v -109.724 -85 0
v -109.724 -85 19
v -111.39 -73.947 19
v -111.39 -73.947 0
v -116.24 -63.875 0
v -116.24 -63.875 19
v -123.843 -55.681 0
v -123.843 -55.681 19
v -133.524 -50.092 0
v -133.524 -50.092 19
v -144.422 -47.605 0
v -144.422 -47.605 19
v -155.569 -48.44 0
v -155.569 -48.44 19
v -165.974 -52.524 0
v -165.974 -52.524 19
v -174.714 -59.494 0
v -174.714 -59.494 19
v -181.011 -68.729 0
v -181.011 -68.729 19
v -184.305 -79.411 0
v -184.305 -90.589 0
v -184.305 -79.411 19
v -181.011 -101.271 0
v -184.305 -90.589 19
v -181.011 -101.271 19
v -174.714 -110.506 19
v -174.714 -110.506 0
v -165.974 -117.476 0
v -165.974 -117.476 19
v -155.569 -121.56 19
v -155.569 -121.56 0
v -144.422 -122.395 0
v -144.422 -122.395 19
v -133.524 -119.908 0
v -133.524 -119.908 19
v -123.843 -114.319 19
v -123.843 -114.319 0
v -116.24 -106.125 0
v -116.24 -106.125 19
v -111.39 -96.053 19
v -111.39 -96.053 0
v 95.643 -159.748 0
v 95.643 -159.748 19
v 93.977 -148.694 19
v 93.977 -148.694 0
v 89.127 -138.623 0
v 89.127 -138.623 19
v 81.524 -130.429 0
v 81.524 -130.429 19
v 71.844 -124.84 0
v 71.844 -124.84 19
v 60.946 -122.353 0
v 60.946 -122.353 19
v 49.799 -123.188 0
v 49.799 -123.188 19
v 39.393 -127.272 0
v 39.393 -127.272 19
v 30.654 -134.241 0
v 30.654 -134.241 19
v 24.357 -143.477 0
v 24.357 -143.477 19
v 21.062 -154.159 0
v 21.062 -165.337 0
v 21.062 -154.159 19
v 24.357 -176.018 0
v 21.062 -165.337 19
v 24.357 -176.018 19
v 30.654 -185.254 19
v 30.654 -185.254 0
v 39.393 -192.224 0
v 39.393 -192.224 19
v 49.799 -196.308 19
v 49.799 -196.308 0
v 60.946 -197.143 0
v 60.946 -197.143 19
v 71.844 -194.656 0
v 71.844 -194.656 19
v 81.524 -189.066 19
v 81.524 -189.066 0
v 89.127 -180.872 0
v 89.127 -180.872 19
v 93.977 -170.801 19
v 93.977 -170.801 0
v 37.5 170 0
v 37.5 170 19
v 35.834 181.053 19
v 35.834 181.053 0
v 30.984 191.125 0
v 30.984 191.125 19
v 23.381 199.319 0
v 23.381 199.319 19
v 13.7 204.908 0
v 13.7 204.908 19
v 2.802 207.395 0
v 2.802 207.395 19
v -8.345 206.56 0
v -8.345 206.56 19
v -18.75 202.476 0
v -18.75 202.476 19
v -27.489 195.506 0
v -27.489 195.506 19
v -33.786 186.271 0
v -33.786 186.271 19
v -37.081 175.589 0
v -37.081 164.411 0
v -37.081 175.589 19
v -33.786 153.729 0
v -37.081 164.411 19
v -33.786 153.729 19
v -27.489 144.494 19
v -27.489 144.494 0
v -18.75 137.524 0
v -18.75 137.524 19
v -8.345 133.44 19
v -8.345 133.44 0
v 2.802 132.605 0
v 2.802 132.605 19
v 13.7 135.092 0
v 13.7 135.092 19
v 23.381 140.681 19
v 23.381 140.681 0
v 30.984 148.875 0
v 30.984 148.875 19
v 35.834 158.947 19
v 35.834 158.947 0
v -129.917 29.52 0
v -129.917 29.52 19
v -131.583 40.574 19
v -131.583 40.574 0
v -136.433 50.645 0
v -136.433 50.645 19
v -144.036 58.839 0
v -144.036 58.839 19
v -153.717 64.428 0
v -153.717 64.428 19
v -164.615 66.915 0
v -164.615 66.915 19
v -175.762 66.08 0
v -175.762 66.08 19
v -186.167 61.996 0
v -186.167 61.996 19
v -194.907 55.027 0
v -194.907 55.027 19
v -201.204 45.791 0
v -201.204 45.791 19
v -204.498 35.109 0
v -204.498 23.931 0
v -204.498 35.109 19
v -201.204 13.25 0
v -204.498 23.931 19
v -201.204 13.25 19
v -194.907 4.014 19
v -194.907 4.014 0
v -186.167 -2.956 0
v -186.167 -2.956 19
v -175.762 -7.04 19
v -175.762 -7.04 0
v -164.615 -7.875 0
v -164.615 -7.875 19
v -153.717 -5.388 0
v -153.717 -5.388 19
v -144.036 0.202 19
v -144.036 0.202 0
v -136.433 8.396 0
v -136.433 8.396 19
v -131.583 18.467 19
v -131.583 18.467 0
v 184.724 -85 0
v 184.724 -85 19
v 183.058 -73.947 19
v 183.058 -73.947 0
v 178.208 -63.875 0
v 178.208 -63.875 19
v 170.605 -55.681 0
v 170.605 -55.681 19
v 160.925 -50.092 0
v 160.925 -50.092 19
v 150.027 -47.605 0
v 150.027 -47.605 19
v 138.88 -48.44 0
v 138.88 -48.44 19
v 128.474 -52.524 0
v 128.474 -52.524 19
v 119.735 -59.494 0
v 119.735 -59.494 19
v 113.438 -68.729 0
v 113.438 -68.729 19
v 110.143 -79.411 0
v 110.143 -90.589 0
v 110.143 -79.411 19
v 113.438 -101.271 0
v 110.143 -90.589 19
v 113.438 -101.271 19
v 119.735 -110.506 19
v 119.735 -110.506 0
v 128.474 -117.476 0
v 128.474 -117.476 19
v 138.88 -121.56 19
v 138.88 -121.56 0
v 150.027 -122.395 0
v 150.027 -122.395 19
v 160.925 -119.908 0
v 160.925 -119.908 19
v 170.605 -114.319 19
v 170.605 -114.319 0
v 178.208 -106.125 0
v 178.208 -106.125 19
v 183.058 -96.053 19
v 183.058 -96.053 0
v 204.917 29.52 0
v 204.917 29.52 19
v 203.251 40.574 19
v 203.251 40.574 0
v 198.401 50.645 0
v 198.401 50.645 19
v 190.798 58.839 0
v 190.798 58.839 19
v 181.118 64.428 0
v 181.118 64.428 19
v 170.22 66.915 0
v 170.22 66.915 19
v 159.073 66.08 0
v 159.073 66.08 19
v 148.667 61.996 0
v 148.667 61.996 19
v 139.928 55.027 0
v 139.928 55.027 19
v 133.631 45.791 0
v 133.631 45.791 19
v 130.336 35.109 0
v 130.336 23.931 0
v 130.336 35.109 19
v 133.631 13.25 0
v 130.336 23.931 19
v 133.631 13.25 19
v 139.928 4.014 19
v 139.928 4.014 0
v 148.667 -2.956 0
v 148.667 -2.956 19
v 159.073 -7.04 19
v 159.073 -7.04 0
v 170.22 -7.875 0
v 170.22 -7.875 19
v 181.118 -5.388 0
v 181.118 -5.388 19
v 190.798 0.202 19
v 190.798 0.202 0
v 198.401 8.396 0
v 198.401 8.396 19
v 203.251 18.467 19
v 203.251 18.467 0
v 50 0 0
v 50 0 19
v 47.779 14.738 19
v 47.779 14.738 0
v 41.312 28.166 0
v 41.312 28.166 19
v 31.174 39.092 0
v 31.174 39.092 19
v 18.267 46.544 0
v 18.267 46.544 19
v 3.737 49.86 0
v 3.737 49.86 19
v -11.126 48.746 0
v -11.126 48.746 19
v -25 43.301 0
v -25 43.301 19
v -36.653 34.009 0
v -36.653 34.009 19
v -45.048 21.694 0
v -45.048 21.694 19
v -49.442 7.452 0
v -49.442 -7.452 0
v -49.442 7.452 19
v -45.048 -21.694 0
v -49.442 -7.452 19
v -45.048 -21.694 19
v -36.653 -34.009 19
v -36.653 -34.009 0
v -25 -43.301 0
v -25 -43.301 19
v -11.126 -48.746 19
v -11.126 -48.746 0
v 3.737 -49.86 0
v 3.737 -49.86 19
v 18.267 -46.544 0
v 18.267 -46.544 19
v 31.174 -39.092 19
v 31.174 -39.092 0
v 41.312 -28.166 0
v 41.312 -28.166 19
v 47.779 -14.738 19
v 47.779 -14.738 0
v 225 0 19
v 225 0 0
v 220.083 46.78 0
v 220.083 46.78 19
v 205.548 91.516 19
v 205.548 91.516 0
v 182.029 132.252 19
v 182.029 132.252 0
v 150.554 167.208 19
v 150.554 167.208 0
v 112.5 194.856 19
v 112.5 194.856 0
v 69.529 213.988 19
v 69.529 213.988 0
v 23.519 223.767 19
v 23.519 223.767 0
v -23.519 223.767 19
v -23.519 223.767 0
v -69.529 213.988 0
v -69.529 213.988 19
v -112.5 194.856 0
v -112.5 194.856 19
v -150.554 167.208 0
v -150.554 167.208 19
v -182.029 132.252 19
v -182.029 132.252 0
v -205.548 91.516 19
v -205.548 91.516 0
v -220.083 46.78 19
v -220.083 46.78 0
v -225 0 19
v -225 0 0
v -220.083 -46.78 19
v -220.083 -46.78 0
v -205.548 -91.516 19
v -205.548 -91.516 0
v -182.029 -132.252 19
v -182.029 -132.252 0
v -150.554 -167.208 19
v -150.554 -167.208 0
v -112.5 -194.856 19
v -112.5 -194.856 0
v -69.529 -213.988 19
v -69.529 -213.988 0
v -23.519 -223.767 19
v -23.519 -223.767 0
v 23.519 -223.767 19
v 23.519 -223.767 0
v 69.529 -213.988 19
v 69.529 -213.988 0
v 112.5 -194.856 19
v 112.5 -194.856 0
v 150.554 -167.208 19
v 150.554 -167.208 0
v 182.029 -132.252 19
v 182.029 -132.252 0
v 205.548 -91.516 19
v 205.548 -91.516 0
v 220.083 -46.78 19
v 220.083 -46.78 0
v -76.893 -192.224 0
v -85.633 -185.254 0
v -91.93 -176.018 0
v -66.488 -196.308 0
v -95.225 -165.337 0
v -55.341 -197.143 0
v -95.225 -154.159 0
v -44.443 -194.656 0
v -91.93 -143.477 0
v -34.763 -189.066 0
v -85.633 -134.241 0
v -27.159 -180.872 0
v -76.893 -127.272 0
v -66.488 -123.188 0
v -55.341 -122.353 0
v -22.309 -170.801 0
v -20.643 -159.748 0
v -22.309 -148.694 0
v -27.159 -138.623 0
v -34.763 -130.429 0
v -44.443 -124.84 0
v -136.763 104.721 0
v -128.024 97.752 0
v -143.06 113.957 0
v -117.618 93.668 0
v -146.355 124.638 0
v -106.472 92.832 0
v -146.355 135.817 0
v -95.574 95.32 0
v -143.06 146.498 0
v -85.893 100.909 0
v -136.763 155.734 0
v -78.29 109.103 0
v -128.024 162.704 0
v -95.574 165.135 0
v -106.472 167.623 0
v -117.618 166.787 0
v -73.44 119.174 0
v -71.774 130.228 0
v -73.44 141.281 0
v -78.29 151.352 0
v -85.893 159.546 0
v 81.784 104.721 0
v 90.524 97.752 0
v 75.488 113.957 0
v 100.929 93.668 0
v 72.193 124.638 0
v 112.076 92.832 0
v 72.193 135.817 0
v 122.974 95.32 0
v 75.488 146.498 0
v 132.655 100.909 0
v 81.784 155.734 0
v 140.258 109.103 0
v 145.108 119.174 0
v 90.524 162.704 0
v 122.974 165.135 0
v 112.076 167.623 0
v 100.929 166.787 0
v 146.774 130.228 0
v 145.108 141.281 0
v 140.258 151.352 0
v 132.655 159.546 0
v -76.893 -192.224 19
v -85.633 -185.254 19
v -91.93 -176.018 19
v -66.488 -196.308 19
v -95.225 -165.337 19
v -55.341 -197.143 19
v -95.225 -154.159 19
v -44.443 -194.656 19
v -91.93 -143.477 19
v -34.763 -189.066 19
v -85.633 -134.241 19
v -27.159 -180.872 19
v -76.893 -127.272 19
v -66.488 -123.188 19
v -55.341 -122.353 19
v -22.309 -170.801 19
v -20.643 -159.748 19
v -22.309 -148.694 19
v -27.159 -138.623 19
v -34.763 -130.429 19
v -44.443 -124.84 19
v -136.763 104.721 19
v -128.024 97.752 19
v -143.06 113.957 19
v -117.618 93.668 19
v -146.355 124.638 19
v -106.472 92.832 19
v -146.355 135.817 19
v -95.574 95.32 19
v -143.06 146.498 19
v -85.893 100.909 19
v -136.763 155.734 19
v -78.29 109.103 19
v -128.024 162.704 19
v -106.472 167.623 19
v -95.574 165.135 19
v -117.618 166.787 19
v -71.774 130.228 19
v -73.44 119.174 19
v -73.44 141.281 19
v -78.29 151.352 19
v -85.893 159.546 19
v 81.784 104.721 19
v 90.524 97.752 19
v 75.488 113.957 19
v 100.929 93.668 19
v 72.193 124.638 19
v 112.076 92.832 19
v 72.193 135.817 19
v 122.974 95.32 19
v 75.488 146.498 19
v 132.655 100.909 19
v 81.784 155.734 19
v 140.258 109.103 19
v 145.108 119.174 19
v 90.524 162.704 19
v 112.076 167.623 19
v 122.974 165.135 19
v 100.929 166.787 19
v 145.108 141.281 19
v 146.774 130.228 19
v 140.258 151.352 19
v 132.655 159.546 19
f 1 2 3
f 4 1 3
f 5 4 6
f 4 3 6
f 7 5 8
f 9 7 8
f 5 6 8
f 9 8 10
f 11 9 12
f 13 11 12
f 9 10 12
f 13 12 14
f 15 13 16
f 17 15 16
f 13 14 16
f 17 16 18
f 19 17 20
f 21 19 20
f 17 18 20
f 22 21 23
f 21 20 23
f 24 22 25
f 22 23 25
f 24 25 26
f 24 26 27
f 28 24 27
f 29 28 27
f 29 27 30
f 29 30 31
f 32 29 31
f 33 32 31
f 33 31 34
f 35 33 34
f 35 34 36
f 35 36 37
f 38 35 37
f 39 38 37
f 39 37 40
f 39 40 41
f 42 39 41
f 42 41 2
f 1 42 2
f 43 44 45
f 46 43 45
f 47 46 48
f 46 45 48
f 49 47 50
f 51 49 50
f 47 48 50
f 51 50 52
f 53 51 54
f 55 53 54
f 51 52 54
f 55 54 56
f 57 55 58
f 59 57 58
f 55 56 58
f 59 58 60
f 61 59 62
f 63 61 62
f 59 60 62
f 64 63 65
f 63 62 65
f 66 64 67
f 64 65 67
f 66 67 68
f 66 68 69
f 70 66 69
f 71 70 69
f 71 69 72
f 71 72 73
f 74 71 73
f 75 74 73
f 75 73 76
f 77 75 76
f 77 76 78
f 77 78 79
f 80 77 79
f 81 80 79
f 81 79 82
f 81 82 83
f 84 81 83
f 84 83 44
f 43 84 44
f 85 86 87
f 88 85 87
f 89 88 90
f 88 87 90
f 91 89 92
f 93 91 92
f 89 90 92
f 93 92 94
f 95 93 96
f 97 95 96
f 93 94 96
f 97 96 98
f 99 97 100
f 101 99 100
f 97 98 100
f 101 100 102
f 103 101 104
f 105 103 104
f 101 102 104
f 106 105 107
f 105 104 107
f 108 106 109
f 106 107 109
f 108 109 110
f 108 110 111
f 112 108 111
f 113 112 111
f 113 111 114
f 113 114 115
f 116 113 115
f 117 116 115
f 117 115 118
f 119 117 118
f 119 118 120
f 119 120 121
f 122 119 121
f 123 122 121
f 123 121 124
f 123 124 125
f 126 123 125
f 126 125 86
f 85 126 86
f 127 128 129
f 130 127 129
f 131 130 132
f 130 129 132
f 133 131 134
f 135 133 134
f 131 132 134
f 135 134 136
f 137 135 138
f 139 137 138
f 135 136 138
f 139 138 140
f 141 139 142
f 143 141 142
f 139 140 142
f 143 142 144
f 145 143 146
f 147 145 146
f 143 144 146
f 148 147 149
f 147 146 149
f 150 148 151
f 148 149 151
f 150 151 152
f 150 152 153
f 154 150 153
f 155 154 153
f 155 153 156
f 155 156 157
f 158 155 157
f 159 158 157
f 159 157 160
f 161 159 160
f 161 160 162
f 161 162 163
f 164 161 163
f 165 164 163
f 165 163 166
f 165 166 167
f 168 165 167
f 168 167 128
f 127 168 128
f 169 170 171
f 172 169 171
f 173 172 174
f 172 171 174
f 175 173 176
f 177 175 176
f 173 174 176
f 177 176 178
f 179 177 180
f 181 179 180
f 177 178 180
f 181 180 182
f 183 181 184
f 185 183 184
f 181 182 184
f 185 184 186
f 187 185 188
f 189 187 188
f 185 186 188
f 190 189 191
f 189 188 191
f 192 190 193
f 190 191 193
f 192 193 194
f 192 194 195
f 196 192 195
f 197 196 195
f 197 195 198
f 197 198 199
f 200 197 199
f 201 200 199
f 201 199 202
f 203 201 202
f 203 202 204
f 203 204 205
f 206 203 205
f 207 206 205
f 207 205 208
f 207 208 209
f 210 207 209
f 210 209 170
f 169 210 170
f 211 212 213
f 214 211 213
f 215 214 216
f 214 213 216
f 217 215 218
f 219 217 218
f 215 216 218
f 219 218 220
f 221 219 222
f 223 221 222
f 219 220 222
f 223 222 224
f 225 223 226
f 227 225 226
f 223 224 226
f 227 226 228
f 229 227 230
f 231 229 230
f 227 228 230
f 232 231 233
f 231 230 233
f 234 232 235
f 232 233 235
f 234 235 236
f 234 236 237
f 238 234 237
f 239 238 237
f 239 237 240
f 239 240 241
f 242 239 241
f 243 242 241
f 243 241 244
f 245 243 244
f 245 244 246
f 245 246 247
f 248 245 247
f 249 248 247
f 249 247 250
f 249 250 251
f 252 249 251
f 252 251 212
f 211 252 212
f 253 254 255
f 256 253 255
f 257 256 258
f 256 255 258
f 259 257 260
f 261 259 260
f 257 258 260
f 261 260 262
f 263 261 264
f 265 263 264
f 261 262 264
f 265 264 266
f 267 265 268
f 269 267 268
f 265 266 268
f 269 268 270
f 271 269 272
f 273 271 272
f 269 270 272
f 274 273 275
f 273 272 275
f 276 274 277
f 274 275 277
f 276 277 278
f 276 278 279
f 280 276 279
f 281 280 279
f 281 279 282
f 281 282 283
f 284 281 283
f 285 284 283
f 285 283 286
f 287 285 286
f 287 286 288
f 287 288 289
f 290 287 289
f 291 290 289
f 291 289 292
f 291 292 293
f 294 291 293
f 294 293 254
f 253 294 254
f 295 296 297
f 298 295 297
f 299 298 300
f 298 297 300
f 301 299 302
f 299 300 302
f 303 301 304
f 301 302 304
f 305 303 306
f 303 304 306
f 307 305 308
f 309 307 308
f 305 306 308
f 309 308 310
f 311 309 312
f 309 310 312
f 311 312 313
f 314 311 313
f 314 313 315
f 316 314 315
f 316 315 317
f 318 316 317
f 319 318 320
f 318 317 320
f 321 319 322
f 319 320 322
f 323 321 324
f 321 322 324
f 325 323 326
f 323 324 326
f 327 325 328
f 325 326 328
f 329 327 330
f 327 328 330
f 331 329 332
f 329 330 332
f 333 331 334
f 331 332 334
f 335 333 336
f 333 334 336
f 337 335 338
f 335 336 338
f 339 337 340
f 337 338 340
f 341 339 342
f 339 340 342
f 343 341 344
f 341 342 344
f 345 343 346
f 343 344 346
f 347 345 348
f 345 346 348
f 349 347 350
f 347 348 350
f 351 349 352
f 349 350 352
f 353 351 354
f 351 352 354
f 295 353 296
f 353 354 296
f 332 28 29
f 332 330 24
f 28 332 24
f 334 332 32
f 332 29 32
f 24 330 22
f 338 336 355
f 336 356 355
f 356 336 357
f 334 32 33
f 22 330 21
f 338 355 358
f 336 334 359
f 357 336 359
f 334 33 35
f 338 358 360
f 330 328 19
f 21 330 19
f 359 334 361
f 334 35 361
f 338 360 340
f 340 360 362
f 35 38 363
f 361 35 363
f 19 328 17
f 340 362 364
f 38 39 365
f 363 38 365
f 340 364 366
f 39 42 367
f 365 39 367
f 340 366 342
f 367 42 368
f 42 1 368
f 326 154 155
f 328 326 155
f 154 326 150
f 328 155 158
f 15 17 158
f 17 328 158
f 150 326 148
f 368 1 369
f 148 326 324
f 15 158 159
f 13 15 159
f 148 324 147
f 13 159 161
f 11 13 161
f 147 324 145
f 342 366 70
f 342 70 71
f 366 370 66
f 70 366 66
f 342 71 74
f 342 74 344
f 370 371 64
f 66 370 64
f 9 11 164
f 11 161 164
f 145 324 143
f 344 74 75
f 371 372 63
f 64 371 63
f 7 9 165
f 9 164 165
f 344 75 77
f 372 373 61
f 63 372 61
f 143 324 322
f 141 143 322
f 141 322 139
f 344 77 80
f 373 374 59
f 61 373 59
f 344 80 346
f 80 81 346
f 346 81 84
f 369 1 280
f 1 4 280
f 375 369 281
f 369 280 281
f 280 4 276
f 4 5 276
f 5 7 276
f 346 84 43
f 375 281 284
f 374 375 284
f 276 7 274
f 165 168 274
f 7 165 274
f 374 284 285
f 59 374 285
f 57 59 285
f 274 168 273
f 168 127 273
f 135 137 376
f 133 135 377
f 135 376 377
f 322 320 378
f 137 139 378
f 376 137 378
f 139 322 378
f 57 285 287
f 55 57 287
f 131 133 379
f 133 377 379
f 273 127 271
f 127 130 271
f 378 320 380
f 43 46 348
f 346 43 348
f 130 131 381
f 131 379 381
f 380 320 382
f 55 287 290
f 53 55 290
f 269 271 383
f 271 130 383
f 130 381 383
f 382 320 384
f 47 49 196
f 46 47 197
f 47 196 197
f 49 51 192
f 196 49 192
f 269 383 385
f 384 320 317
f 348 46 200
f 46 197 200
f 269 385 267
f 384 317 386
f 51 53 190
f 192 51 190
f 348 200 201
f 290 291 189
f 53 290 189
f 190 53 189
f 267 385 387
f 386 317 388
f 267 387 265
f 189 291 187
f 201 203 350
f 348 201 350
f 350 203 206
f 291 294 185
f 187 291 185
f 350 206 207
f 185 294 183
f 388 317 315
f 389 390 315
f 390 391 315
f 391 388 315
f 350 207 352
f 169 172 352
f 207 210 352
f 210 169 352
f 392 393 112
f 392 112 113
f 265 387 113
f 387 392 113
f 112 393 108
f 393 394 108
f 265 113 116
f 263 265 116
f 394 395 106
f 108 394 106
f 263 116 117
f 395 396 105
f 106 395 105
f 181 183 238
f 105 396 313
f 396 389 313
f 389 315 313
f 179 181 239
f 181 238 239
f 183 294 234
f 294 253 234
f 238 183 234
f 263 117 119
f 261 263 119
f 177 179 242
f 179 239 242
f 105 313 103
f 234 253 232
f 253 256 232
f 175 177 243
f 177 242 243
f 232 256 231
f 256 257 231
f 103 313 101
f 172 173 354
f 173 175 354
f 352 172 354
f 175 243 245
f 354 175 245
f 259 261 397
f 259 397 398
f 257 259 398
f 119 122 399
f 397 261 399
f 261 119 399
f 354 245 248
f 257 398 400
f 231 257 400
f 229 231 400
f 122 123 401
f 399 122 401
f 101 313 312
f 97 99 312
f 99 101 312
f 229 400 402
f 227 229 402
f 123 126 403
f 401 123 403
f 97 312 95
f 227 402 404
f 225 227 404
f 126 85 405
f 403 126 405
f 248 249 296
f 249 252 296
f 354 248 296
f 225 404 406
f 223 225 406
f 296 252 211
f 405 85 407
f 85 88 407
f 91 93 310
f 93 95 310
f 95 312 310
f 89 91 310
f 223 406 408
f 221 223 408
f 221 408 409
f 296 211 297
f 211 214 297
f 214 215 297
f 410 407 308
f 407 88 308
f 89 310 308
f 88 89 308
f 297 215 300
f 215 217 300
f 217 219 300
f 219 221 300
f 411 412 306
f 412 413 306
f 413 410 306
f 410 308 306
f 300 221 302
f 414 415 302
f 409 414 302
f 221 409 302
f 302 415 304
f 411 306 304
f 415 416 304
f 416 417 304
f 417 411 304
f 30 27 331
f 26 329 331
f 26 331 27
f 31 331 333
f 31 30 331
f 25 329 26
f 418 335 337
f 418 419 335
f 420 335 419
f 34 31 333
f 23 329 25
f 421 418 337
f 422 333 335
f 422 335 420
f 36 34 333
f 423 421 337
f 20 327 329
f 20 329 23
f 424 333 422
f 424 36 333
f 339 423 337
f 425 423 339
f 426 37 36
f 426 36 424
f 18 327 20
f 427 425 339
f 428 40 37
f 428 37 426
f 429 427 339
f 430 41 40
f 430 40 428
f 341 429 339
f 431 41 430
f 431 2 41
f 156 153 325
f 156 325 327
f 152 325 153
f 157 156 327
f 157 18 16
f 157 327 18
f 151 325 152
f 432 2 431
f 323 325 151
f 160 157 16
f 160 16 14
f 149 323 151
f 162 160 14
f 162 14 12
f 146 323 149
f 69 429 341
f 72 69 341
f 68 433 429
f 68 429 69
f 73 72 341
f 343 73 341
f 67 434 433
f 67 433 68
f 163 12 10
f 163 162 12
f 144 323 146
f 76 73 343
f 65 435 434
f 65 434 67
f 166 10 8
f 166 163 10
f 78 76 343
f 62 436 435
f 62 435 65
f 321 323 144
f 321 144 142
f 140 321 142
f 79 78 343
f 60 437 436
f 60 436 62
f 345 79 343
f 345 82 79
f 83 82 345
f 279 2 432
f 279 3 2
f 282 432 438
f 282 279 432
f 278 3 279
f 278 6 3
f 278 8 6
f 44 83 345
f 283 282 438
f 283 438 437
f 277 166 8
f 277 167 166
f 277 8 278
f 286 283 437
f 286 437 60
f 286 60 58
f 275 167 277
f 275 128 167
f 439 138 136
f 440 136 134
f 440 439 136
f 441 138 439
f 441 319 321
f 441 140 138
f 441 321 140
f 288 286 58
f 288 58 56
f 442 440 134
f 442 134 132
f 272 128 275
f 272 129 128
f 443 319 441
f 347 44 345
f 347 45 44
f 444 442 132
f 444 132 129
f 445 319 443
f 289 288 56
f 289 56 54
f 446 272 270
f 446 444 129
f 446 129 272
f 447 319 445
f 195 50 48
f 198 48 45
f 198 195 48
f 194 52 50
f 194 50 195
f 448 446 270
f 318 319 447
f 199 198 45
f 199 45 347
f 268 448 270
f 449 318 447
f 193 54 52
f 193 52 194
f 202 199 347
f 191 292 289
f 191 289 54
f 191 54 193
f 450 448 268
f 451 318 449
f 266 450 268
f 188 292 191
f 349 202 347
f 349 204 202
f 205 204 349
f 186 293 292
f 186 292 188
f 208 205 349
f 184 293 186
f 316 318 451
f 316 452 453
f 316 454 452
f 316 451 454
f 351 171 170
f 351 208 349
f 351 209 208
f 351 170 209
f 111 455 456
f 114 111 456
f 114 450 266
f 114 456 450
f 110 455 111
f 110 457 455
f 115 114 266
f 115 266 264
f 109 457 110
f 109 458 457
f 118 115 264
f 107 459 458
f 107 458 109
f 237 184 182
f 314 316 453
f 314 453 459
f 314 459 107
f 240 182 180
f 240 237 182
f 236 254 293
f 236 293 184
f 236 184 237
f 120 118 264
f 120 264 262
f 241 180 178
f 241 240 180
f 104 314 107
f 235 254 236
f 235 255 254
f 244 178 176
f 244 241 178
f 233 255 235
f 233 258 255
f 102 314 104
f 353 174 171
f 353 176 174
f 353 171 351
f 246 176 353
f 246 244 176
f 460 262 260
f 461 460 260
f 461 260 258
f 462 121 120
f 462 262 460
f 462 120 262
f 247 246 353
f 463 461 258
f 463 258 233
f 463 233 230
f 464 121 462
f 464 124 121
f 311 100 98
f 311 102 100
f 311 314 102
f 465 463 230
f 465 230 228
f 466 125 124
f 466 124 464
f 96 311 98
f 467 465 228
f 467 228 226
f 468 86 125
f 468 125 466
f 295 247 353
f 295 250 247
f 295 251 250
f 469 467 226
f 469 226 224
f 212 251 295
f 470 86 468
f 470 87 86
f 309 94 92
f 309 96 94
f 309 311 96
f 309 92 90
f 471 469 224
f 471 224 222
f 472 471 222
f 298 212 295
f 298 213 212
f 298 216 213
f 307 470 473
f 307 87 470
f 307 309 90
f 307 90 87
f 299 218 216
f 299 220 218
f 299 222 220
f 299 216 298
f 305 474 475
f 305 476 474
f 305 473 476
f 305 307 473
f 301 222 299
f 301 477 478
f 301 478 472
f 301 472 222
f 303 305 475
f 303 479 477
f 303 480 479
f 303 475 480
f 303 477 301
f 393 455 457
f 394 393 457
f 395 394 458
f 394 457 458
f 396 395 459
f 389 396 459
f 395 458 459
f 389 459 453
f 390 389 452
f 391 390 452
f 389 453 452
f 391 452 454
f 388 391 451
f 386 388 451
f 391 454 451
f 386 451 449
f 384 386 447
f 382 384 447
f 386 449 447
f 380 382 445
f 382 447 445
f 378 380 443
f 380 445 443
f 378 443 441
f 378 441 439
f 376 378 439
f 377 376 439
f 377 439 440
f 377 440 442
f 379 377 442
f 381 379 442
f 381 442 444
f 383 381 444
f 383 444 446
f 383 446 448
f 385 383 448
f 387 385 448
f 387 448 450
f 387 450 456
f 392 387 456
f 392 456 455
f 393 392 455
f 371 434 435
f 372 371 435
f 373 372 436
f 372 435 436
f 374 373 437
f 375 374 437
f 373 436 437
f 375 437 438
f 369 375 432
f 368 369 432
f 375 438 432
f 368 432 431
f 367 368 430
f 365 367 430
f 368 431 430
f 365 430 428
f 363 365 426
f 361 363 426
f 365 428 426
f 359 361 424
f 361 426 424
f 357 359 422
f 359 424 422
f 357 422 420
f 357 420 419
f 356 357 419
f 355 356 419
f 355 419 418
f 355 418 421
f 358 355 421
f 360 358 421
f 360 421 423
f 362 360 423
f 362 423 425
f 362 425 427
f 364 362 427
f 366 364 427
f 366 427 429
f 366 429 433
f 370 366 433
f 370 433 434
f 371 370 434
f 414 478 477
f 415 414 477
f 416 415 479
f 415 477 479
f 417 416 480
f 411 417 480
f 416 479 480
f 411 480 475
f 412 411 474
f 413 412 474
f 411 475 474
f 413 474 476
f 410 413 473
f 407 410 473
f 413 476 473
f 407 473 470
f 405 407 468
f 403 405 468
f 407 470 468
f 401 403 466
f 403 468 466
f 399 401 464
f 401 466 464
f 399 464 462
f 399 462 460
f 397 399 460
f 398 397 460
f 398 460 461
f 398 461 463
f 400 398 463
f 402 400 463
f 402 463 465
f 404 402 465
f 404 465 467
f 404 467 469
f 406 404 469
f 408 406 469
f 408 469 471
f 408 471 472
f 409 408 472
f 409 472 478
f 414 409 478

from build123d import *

# Parameters (mm, degrees)
F0_R     = 225
F1_DEPTH = 19
F2_R     = 50
F2_R_2   = 37.5
F3_DEPTH = 53


with BuildPart() as f1:
    # F0 (on Top) → F1 (new body)
    with BuildSketch(Plane.XY):
        Circle(F0_R)
    extrude(amount=F1_DEPTH)

    # F2 (on face) → F3 (cut)
    with BuildSketch(Plane.XY.offset(19)):
        Circle(F2_R)
        with Locations((0, 170)):
            Circle(F2_R_2)
        with Locations((-109.273894, 130.227555)):
            Circle(F2_R_2)
        with Locations((-167.417318, 29.52019)):
            Circle(F2_R_2)
        with Locations((-147.224319, -85)):
            Circle(F2_R_2)
        with Locations((-58.143424, -159.747746)):
            Circle(F2_R_2)
        with Locations((58.143424, -159.747746)):
            Circle(F2_R_2)
        with Locations((147.224319, -85)):
            Circle(F2_R_2)
        with Locations((167.417318, 29.52019)):
            Circle(F2_R_2)
        with Locations((109.273894, 130.227555)):
            Circle(F2_R_2)
    extrude(amount=-F3_DEPTH, mode=Mode.SUBTRACT)


solid = f1.part
